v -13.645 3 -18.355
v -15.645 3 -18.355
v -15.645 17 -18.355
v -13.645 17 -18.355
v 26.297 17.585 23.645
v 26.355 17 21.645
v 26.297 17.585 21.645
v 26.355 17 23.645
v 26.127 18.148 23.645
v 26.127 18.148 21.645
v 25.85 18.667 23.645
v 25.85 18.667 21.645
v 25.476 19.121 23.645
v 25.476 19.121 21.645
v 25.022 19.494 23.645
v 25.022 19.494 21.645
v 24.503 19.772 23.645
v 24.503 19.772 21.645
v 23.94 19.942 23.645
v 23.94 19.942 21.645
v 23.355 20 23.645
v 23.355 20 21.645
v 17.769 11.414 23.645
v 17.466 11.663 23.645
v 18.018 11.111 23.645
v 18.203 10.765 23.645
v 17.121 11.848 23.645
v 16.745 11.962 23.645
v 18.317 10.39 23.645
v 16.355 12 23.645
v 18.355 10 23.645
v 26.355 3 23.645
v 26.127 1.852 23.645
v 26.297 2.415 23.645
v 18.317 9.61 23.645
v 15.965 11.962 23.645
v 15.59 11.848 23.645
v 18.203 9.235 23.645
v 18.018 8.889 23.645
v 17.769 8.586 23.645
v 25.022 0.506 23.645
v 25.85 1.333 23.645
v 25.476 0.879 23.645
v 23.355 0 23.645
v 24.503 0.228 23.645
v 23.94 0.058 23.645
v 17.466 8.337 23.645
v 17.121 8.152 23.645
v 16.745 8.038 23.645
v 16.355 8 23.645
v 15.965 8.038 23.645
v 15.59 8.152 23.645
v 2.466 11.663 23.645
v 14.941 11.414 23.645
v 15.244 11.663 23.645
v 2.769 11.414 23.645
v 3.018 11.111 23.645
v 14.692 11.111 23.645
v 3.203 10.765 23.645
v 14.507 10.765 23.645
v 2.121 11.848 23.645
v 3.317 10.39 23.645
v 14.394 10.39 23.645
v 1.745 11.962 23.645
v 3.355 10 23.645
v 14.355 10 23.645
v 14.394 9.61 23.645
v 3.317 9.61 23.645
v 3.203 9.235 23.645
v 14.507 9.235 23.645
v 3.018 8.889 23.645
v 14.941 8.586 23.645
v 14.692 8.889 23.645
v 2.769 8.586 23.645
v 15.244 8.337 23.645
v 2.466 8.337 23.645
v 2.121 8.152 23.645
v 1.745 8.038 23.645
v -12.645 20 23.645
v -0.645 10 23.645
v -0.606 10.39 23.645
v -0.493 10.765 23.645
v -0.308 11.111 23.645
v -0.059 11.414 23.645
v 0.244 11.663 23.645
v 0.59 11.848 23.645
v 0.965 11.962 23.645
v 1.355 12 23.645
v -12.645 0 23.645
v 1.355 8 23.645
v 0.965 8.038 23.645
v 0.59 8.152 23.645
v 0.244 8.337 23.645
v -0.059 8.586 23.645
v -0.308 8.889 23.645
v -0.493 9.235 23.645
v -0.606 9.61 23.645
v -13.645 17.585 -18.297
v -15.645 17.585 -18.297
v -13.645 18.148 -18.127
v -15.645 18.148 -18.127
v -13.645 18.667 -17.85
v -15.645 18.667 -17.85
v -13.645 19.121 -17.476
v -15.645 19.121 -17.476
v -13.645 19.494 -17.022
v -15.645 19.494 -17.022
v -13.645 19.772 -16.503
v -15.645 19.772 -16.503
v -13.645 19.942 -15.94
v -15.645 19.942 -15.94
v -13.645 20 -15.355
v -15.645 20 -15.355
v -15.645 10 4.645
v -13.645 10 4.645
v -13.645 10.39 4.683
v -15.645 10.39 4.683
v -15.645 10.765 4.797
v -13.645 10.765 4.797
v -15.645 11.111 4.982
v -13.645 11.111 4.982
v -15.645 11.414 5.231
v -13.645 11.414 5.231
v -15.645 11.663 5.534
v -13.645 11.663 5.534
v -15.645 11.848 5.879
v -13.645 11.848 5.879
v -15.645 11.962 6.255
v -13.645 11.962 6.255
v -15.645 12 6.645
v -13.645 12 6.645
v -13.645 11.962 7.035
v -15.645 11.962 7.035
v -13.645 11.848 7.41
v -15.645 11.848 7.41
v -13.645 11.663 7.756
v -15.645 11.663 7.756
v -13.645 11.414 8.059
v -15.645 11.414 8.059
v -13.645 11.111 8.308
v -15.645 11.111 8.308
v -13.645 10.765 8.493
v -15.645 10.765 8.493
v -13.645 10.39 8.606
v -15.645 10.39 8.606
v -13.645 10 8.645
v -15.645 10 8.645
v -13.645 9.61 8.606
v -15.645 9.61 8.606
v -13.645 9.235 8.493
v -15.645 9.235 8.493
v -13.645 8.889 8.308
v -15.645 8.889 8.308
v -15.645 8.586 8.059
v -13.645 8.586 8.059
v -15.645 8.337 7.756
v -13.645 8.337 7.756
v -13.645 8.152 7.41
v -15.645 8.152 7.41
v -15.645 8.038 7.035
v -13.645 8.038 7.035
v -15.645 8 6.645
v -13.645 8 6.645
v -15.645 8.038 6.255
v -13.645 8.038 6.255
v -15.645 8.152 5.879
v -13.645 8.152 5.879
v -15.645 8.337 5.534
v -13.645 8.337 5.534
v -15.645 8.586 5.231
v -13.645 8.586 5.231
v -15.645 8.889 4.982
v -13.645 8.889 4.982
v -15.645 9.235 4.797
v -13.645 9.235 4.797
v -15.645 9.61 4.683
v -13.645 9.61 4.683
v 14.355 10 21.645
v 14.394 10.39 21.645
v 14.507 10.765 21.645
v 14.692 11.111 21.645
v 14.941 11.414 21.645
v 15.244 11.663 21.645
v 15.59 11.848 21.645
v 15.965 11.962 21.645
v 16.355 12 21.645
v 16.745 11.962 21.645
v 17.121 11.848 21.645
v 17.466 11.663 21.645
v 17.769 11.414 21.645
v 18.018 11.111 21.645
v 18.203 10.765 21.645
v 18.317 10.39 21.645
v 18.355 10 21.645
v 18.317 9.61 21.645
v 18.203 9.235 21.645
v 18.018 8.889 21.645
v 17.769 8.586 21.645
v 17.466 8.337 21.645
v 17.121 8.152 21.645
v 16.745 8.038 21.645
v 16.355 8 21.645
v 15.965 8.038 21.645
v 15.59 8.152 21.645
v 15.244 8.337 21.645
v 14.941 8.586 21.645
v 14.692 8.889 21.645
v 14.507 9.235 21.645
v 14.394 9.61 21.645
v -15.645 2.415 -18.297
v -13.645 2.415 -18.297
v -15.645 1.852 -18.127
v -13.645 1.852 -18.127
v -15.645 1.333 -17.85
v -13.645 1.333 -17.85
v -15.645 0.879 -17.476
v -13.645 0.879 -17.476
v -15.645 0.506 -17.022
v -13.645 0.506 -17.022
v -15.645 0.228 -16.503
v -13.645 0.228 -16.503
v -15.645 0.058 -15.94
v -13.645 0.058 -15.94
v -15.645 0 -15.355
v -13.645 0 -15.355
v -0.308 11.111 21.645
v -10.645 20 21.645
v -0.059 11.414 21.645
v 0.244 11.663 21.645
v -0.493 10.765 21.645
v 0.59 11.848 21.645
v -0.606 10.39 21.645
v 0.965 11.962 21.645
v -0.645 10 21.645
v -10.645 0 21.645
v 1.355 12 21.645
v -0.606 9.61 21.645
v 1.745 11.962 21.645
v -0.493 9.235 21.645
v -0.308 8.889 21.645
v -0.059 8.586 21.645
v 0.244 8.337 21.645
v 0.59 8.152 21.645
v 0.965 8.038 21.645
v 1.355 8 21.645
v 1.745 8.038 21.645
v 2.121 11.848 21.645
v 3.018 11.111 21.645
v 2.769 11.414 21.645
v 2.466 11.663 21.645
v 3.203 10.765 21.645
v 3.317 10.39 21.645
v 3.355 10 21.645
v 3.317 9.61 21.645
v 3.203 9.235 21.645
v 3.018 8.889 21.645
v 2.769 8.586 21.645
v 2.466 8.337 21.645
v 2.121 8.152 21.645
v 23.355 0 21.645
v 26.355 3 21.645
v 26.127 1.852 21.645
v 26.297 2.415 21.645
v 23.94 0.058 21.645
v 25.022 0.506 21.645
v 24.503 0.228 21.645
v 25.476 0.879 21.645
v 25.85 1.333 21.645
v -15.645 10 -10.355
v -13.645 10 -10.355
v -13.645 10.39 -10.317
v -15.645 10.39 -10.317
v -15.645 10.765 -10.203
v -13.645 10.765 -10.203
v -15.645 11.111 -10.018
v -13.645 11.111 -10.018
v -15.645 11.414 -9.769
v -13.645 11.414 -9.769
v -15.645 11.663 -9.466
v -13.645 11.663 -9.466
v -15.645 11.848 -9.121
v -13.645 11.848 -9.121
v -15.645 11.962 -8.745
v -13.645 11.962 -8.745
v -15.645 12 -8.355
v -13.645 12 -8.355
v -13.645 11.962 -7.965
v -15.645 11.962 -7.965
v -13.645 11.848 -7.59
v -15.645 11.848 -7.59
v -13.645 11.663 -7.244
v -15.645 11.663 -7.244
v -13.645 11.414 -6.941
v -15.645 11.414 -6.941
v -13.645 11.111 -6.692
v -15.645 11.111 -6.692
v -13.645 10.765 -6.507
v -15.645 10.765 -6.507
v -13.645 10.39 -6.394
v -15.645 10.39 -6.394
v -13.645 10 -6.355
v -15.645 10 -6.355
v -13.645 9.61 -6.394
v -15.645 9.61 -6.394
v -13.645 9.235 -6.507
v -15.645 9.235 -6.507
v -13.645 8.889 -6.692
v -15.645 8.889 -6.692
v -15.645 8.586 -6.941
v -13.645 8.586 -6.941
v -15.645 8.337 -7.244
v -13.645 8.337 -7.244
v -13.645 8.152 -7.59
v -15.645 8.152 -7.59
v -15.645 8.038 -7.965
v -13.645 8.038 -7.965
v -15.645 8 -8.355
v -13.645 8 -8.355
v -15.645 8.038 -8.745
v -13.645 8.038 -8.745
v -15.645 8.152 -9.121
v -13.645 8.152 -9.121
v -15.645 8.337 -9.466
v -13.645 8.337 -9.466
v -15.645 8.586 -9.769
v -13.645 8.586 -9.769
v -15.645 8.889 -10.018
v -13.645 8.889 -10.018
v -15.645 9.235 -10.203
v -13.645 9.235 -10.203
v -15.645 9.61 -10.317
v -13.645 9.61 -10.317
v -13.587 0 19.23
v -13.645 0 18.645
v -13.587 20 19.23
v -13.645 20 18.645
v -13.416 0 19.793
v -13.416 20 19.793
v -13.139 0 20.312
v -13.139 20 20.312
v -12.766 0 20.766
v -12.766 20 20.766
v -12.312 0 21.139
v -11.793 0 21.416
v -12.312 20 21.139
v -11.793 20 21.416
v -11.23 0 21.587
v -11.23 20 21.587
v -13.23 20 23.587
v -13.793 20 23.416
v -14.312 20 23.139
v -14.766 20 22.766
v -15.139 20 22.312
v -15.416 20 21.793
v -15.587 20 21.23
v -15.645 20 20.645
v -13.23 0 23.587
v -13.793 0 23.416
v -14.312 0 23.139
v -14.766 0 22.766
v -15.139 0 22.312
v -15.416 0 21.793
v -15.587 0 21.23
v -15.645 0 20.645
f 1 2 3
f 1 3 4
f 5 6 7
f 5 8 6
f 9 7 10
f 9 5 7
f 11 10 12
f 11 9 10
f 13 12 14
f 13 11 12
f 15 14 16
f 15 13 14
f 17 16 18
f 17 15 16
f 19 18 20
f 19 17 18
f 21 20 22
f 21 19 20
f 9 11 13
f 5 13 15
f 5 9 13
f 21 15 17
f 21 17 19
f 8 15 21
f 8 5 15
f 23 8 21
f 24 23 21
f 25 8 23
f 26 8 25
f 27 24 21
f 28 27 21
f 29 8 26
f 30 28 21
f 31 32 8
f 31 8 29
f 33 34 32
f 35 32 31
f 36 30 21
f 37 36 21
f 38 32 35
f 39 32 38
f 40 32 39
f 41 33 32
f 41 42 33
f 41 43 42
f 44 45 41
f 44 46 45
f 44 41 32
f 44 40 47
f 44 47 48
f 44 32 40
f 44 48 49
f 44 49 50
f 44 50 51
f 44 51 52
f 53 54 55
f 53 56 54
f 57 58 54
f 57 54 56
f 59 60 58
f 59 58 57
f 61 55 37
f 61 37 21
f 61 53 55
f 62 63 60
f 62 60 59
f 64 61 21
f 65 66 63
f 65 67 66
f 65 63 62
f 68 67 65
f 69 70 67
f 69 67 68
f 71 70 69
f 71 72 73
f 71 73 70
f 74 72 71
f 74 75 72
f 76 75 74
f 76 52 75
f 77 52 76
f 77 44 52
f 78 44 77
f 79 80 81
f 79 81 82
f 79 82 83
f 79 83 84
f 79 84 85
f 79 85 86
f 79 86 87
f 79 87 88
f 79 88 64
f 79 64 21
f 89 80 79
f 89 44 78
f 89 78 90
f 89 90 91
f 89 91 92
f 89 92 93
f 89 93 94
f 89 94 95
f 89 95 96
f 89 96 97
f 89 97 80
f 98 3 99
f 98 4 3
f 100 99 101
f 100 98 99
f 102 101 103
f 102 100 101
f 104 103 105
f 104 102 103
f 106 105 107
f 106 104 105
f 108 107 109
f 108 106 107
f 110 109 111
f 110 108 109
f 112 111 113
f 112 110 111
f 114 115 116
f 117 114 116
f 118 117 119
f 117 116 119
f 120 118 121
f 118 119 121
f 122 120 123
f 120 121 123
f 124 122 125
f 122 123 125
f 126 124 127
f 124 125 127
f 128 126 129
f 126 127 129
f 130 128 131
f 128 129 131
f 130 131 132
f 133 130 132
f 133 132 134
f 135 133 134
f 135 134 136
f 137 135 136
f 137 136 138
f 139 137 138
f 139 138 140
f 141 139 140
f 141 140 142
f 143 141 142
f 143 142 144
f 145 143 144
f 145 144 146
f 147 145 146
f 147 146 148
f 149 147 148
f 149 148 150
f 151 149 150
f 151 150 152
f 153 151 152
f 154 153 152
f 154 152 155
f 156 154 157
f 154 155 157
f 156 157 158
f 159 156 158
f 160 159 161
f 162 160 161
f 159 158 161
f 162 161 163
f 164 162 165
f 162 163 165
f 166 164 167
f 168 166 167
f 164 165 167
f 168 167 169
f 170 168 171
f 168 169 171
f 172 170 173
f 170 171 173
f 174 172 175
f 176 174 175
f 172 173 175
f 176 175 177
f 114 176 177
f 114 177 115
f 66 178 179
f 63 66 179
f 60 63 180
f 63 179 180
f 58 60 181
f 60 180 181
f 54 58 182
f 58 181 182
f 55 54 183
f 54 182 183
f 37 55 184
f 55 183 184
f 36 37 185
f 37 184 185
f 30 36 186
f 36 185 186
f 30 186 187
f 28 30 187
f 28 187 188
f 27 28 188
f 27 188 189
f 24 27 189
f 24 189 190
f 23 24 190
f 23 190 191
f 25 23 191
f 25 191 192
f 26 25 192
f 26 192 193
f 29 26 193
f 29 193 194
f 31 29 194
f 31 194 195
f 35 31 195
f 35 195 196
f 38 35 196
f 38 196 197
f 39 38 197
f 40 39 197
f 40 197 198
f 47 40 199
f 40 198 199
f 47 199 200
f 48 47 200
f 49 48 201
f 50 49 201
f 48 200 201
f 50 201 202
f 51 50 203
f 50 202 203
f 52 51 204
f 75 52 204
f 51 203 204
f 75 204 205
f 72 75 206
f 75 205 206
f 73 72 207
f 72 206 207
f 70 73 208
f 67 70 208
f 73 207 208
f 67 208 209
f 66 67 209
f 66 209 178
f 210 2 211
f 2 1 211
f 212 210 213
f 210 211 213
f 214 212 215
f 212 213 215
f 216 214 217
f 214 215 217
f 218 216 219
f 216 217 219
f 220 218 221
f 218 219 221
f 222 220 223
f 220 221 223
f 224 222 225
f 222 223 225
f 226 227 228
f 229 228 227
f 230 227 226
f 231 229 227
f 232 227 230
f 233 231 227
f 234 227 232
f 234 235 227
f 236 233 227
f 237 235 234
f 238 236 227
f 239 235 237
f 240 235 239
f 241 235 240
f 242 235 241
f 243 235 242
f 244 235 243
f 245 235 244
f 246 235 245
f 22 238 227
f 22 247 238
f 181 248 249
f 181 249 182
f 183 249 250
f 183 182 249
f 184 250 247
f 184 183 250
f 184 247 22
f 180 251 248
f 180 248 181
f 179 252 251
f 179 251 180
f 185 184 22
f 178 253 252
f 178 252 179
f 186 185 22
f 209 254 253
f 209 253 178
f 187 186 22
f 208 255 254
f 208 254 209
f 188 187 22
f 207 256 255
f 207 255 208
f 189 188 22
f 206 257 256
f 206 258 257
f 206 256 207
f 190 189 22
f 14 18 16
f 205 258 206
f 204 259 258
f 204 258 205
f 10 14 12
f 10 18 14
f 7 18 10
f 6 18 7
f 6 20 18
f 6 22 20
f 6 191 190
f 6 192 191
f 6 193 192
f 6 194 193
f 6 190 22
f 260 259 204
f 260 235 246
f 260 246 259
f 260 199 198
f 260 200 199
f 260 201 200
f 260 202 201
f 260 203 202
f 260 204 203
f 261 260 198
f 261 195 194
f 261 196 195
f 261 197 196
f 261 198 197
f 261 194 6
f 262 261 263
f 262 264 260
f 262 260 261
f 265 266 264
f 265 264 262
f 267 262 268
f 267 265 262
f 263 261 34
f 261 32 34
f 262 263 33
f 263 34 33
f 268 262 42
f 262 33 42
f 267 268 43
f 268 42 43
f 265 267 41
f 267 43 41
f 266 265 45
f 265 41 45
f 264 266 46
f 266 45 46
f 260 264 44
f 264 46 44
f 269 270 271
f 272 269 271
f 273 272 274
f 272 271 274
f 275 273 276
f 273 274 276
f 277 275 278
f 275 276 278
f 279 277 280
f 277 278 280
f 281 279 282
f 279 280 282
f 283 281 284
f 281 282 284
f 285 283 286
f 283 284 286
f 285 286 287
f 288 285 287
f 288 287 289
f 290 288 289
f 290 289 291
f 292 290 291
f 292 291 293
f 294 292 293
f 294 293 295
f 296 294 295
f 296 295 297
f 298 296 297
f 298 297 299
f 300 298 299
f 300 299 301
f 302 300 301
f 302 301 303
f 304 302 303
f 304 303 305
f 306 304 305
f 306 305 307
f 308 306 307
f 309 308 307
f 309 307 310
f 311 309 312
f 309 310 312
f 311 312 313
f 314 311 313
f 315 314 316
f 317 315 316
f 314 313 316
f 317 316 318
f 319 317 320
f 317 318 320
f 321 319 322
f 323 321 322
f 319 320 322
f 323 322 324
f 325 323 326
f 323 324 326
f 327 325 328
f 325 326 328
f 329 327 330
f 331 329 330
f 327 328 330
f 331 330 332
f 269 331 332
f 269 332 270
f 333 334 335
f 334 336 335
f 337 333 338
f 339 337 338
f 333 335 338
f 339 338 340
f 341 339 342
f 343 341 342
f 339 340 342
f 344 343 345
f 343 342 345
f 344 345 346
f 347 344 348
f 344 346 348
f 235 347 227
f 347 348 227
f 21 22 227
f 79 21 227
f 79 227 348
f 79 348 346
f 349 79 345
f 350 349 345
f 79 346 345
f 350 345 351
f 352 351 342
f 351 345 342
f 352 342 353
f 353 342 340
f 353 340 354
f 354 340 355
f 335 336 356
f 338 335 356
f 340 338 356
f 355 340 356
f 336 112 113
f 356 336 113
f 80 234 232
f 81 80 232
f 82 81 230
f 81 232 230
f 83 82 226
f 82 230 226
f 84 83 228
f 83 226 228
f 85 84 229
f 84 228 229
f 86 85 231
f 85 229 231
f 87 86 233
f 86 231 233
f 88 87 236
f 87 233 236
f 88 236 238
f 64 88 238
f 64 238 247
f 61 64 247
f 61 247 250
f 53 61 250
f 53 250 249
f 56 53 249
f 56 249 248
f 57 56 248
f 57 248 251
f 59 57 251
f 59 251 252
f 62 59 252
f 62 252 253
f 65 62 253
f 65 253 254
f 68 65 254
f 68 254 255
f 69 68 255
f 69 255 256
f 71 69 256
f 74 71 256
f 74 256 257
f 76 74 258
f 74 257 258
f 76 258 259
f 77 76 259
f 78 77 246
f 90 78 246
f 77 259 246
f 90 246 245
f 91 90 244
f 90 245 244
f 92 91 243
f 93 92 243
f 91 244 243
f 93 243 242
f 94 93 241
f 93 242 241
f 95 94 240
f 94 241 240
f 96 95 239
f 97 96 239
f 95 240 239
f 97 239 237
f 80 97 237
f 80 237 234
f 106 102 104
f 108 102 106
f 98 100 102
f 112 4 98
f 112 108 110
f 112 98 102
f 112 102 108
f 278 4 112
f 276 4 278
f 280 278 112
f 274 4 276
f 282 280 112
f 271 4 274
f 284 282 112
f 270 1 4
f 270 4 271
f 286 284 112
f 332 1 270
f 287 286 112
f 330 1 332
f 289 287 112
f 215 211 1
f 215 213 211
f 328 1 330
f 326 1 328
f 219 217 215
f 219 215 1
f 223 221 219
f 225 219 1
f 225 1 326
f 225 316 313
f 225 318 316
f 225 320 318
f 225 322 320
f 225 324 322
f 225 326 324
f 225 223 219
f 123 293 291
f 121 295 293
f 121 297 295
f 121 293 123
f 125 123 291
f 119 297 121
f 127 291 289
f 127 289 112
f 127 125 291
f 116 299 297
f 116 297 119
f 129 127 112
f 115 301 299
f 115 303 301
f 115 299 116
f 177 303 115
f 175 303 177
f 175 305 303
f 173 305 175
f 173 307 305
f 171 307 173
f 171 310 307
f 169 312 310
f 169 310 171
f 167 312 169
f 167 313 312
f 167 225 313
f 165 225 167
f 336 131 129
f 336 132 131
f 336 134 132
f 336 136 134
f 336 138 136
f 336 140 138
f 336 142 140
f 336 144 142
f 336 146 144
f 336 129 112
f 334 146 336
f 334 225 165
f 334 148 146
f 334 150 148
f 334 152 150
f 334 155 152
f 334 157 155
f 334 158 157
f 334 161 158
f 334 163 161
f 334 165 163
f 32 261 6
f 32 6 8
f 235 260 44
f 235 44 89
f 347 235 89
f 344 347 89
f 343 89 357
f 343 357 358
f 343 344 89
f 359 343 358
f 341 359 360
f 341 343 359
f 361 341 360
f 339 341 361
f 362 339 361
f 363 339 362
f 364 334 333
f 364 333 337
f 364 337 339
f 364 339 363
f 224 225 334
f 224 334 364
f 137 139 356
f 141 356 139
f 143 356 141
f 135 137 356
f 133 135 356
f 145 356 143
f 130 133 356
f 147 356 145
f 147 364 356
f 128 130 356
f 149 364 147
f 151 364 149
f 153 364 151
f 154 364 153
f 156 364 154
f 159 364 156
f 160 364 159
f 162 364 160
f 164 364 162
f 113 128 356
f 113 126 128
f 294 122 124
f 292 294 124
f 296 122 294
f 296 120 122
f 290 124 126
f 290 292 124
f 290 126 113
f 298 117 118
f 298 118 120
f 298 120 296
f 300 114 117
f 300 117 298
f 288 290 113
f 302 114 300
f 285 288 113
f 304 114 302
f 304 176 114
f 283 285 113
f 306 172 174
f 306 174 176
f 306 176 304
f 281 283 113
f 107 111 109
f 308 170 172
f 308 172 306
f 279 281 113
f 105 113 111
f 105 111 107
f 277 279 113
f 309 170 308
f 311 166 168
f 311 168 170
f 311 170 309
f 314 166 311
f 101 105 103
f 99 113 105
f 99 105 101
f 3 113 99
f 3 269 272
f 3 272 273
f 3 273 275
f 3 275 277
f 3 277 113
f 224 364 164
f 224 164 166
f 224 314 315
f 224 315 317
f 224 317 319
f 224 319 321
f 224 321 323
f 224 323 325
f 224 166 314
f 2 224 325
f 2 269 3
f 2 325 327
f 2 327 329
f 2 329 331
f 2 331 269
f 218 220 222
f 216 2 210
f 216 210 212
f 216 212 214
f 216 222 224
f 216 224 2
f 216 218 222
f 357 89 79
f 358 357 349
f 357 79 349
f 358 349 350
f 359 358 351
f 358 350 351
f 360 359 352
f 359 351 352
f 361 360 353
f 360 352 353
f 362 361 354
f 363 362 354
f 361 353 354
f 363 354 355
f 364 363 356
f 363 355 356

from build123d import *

# Parameters (mm, degrees)
BOSS_EXTRUDE1_DEPTH = 20
FILLET1_R           = 3
SKETCH3_R           = 2
CUT_EXTRUDE1_DEPTH  = 52.909473261
SKETCH4_R           = 2
CUT_EXTRUDE2_DEPTH  = 51.587344223


with BuildPart() as part:
    # Sketch1 → Boss-Extrude1 (new body)
    with BuildSketch(Plane(origin=(0, 0, 0), x_dir=(1, 0, 0), z_dir=(0, 1, 0))):
        Polygon((-13.644859813, 18.355140187), (-13.644859813, -21.644859813), (26.355140187, -21.644859813), (26.355140187, -23.644859813), (-15.644859813, -23.644859813), (-15.644859813, 18.355140187), align=None)
    extrude(amount=BOSS_EXTRUDE1_DEPTH)

    # Fillet1
    fillet1_edges = [part.edges().sort_by_distance(p)[0] for p in [
        (-13.644859813, 10, 21.644859813),
        (-15.644859813, 10, 23.644859813),
        (26.355140187, 20, 22.644859813),
        (-14.644859813, 20, -18.355140187),
        (26.355140187, 0, 22.644859813),
        (-14.644859813, 0, -18.355140187),
    ]]
    fillet(fillet1_edges, radius=FILLET1_R)

    # Sketch3 → Cut-Extrude1 (cut, through all)
    with BuildSketch(Plane(origin=(0, 0, 21.644859813), x_dir=(-1, 0, 0), z_dir=(0, 0, -1))):
        with Locations((-1.355140187, 10)):
            Circle(SKETCH3_R)
        with Locations((-16.355140187, 10)):
            Circle(SKETCH3_R)
    extrude(amount=-CUT_EXTRUDE1_DEPTH, mode=Mode.SUBTRACT)

    # Sketch4 → Cut-Extrude2 (cut, through all)
    with BuildSketch(Plane(origin=(-13.644859813, 0, 0), x_dir=(0, 0, -1), z_dir=(1, 0, 0))):
        with Locations((8.355140187, 10)):
            Circle(SKETCH4_R)
        with Locations((-6.644859813, 10)):
            Circle(SKETCH4_R)
    extrude(amount=-CUT_EXTRUDE2_DEPTH, mode=Mode.SUBTRACT)


solid = part.part
